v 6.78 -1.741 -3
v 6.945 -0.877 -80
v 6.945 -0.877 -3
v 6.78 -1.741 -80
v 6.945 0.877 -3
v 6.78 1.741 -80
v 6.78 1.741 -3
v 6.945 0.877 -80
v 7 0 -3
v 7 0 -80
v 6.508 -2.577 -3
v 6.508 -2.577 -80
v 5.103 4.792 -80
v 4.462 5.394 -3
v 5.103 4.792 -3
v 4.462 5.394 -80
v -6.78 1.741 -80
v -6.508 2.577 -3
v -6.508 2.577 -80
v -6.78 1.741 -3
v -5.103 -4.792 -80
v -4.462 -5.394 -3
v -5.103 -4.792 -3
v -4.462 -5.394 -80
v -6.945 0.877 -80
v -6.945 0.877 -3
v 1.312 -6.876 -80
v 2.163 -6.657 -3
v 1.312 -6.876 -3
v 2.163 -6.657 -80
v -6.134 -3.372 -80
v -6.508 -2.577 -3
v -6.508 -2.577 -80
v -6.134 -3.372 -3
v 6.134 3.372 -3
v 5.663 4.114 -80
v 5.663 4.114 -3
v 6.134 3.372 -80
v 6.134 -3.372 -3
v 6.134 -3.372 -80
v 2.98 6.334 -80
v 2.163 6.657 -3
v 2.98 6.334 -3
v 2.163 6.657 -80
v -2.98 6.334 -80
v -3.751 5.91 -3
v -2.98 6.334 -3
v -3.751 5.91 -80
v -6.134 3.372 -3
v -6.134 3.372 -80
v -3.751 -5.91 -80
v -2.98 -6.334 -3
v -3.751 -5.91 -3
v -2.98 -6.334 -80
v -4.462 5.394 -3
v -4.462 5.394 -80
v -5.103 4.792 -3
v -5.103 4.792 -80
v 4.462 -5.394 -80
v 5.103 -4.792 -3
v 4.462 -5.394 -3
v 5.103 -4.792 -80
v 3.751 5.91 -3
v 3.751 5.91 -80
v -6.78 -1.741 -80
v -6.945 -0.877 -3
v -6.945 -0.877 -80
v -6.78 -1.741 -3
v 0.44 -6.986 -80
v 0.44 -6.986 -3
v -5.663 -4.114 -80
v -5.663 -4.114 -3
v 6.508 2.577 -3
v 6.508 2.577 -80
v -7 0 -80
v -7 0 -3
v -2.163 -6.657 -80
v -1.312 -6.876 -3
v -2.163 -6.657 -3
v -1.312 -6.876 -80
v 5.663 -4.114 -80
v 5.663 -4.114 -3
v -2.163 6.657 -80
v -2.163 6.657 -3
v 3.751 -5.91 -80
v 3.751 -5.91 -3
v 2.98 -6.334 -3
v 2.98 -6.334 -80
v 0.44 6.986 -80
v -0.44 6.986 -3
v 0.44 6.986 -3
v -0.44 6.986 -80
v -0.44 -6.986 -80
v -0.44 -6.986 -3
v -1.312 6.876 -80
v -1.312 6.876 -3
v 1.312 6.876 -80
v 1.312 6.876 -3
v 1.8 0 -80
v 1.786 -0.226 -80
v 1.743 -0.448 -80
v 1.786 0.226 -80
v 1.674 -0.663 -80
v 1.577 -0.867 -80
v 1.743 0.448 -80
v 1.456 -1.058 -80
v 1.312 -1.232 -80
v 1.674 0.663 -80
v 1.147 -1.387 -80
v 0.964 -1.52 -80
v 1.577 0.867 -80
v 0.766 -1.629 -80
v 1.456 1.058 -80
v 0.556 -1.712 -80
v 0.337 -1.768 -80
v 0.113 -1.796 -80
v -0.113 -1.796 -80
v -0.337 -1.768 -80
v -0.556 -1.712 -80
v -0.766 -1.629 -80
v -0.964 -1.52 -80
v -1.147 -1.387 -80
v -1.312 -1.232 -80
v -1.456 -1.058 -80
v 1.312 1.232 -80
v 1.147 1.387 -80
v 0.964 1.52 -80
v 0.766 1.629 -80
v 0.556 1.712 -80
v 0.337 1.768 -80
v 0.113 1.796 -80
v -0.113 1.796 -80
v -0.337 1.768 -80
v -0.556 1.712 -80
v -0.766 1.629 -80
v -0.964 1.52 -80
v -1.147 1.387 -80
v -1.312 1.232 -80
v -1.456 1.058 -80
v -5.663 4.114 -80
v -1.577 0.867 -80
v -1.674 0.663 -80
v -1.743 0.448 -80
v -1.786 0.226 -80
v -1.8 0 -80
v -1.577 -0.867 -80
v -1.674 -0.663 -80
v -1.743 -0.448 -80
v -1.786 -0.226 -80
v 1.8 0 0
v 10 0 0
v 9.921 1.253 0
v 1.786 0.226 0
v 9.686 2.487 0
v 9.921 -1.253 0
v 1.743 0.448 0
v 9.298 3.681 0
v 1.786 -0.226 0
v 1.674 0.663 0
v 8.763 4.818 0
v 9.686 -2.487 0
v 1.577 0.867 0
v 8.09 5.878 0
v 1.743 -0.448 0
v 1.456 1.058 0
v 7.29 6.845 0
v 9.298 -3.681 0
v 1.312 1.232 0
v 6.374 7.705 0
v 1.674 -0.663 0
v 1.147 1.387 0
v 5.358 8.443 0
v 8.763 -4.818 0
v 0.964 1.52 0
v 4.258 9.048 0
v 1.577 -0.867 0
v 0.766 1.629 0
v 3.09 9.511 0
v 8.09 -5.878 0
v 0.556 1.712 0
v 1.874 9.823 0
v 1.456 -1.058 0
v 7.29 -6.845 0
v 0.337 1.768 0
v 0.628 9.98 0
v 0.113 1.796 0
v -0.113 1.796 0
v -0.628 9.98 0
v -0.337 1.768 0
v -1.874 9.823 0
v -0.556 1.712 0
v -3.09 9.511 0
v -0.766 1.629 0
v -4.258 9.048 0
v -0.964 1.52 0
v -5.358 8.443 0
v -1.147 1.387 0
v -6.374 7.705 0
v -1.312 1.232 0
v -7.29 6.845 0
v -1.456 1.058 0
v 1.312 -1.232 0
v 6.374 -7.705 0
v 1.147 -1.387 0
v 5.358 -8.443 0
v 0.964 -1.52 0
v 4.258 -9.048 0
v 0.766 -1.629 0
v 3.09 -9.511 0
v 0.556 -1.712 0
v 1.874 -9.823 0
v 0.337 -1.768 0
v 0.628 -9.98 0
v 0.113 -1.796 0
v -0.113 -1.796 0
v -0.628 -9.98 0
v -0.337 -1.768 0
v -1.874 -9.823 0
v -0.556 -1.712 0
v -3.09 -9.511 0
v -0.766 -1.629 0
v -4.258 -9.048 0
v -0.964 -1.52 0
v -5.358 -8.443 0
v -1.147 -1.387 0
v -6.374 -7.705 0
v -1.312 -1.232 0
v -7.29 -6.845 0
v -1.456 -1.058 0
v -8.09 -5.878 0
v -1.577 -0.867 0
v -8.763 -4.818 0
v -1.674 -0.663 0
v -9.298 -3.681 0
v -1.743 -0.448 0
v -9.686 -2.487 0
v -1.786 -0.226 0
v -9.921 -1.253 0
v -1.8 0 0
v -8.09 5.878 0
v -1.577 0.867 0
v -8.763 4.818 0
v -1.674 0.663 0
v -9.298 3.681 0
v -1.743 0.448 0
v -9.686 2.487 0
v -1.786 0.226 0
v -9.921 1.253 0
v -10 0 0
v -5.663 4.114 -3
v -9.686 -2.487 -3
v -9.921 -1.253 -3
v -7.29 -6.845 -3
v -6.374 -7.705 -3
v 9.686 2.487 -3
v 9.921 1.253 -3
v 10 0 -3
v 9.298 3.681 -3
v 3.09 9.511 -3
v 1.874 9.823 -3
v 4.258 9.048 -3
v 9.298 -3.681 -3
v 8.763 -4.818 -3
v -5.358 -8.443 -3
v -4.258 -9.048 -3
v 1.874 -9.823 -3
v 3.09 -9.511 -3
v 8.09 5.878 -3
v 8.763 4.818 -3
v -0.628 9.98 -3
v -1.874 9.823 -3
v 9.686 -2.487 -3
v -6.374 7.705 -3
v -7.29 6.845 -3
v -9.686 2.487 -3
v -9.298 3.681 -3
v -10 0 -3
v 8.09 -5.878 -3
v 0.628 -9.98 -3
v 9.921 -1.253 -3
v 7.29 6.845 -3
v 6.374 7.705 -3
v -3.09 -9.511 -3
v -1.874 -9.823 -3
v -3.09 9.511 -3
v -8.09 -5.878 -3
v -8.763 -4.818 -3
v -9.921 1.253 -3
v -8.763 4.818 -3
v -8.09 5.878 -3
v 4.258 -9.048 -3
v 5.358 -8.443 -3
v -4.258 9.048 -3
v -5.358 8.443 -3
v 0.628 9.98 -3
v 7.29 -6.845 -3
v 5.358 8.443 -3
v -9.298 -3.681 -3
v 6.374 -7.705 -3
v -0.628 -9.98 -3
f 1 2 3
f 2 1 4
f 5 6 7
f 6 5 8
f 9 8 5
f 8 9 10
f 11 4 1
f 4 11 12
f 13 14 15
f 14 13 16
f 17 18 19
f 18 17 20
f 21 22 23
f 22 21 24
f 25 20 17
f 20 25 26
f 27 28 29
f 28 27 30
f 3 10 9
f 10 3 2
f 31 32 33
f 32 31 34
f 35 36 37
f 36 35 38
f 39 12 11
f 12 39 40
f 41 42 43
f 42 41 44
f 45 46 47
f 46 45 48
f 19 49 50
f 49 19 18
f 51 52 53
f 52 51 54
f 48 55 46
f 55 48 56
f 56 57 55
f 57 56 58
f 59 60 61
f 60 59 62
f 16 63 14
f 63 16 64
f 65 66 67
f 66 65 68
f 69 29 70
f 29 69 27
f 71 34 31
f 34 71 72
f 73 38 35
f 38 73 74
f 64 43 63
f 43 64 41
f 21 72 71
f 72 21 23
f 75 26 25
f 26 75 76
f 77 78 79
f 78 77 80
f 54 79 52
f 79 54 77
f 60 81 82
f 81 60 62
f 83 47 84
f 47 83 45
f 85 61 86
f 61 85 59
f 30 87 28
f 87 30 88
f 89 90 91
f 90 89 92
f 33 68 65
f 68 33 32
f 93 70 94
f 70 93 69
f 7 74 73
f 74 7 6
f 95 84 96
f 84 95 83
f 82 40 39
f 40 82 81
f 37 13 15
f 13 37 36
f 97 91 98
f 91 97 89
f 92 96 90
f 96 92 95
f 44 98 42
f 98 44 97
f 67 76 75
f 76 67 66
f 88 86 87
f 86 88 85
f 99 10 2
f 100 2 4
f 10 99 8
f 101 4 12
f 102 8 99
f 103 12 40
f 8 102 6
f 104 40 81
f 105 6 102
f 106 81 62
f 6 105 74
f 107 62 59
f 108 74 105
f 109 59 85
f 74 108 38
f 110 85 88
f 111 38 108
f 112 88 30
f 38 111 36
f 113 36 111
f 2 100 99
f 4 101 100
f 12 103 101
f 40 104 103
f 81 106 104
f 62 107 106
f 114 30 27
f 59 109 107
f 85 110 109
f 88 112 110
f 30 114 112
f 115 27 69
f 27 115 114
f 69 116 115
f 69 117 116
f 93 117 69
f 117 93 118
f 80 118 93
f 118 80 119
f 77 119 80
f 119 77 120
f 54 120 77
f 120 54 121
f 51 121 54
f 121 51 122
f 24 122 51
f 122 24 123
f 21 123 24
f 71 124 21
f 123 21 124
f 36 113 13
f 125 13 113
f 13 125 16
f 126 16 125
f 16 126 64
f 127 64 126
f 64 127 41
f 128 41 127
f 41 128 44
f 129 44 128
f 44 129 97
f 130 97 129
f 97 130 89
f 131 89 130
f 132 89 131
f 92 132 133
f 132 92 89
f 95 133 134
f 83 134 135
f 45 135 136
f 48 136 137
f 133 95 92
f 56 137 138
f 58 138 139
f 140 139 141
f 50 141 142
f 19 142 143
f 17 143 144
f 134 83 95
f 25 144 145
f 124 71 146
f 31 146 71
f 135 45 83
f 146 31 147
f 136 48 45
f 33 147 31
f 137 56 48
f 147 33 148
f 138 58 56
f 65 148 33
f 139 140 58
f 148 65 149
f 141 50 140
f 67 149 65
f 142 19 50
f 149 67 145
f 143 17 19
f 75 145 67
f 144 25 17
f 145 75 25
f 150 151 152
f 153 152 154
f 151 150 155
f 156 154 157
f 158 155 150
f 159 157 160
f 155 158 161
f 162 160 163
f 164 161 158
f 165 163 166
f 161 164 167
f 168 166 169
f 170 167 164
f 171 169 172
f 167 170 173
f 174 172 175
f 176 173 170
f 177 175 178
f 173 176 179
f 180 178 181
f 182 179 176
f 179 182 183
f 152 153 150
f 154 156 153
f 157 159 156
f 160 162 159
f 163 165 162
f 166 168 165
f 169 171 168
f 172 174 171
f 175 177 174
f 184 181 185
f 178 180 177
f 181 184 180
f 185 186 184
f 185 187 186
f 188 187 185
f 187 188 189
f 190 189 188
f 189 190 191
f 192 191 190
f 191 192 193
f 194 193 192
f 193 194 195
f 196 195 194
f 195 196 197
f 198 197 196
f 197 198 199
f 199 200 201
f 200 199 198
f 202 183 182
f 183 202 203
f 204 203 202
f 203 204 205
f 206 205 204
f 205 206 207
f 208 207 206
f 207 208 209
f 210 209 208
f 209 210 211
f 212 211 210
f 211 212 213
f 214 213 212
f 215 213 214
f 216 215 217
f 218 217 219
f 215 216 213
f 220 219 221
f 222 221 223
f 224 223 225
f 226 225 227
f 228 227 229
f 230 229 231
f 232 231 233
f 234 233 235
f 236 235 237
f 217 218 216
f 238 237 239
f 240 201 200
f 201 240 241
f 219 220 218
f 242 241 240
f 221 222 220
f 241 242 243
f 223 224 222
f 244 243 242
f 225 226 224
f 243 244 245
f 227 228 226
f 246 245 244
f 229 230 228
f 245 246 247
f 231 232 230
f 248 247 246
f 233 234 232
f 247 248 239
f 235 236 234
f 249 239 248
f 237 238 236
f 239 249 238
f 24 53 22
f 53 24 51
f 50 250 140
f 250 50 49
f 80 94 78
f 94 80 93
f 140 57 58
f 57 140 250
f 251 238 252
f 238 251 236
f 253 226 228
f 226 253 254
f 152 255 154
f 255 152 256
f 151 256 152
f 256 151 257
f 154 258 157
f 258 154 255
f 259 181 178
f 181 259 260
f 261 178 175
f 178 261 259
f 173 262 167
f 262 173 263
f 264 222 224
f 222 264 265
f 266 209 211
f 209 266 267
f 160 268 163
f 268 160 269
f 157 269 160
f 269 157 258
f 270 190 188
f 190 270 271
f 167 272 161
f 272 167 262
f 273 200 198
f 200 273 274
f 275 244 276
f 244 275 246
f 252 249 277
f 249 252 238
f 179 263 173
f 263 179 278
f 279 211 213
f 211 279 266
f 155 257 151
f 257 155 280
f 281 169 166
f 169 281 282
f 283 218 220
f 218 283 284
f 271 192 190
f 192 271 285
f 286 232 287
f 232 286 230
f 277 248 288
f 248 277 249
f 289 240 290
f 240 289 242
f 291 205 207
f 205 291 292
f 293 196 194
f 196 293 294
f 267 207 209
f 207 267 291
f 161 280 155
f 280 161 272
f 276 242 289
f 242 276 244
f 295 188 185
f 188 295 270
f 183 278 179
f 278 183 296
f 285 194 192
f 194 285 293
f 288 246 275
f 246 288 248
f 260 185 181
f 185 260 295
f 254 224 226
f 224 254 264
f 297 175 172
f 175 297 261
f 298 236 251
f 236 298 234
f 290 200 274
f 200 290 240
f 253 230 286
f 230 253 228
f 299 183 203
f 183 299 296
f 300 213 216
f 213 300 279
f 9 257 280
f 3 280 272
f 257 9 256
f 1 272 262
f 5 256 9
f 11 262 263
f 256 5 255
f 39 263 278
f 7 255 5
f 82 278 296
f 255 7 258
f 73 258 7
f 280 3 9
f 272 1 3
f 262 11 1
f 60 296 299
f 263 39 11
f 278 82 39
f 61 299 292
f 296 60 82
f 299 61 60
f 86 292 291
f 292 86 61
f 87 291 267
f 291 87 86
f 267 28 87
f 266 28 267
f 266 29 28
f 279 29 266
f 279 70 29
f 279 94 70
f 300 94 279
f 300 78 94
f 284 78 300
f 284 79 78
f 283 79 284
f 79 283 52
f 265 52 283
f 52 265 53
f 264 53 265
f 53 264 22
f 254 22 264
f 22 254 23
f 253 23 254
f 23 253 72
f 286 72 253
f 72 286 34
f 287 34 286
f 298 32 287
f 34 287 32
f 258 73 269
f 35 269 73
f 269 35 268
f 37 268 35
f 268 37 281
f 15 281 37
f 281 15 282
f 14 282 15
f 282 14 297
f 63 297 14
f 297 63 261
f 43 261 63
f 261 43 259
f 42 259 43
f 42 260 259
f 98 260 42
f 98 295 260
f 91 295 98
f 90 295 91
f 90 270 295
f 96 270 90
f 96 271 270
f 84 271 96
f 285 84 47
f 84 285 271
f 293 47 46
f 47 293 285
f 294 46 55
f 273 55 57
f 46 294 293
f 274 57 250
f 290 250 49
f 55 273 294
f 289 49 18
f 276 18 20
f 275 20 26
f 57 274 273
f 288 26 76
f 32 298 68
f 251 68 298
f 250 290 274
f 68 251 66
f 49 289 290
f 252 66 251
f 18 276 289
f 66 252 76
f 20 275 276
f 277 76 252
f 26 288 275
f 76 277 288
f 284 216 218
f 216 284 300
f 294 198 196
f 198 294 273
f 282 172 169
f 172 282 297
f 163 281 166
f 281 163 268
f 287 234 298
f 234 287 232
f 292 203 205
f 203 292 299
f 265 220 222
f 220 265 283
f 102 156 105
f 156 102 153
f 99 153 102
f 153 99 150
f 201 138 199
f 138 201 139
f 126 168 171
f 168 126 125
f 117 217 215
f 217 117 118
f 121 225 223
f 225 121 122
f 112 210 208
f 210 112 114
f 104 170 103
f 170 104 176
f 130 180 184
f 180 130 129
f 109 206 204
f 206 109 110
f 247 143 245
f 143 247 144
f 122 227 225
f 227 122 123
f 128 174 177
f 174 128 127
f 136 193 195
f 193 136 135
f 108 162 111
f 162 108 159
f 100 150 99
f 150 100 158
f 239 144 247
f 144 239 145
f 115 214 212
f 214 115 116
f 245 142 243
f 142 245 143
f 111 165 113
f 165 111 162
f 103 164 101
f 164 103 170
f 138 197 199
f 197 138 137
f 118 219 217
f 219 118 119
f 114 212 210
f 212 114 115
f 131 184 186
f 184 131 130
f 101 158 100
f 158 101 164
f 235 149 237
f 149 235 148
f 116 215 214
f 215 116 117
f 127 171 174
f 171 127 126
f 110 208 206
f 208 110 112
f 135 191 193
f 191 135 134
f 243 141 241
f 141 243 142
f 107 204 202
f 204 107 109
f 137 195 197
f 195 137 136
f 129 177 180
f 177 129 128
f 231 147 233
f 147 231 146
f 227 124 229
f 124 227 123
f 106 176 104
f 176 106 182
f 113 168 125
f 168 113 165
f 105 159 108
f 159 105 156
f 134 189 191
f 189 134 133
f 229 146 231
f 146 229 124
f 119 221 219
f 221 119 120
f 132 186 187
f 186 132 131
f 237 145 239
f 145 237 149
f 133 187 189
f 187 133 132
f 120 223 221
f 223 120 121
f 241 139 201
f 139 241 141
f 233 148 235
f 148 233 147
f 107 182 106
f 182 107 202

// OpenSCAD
$fn = 50;


difference() {
	union() {
		translate(v = [0, 0, -80.0000000000]) {
			cylinder(h = 80, r = 7.0000000000);
		}
		translate(v = [0, 0, -3.0000000000]) {
			cylinder(h = 3, r = 10.0000000000);
		}
	}
	union() {
		#translate(v = [0, 0, -80]) {
			cylinder(h = 80, r = 1.8000000000);
		}
	}
}
